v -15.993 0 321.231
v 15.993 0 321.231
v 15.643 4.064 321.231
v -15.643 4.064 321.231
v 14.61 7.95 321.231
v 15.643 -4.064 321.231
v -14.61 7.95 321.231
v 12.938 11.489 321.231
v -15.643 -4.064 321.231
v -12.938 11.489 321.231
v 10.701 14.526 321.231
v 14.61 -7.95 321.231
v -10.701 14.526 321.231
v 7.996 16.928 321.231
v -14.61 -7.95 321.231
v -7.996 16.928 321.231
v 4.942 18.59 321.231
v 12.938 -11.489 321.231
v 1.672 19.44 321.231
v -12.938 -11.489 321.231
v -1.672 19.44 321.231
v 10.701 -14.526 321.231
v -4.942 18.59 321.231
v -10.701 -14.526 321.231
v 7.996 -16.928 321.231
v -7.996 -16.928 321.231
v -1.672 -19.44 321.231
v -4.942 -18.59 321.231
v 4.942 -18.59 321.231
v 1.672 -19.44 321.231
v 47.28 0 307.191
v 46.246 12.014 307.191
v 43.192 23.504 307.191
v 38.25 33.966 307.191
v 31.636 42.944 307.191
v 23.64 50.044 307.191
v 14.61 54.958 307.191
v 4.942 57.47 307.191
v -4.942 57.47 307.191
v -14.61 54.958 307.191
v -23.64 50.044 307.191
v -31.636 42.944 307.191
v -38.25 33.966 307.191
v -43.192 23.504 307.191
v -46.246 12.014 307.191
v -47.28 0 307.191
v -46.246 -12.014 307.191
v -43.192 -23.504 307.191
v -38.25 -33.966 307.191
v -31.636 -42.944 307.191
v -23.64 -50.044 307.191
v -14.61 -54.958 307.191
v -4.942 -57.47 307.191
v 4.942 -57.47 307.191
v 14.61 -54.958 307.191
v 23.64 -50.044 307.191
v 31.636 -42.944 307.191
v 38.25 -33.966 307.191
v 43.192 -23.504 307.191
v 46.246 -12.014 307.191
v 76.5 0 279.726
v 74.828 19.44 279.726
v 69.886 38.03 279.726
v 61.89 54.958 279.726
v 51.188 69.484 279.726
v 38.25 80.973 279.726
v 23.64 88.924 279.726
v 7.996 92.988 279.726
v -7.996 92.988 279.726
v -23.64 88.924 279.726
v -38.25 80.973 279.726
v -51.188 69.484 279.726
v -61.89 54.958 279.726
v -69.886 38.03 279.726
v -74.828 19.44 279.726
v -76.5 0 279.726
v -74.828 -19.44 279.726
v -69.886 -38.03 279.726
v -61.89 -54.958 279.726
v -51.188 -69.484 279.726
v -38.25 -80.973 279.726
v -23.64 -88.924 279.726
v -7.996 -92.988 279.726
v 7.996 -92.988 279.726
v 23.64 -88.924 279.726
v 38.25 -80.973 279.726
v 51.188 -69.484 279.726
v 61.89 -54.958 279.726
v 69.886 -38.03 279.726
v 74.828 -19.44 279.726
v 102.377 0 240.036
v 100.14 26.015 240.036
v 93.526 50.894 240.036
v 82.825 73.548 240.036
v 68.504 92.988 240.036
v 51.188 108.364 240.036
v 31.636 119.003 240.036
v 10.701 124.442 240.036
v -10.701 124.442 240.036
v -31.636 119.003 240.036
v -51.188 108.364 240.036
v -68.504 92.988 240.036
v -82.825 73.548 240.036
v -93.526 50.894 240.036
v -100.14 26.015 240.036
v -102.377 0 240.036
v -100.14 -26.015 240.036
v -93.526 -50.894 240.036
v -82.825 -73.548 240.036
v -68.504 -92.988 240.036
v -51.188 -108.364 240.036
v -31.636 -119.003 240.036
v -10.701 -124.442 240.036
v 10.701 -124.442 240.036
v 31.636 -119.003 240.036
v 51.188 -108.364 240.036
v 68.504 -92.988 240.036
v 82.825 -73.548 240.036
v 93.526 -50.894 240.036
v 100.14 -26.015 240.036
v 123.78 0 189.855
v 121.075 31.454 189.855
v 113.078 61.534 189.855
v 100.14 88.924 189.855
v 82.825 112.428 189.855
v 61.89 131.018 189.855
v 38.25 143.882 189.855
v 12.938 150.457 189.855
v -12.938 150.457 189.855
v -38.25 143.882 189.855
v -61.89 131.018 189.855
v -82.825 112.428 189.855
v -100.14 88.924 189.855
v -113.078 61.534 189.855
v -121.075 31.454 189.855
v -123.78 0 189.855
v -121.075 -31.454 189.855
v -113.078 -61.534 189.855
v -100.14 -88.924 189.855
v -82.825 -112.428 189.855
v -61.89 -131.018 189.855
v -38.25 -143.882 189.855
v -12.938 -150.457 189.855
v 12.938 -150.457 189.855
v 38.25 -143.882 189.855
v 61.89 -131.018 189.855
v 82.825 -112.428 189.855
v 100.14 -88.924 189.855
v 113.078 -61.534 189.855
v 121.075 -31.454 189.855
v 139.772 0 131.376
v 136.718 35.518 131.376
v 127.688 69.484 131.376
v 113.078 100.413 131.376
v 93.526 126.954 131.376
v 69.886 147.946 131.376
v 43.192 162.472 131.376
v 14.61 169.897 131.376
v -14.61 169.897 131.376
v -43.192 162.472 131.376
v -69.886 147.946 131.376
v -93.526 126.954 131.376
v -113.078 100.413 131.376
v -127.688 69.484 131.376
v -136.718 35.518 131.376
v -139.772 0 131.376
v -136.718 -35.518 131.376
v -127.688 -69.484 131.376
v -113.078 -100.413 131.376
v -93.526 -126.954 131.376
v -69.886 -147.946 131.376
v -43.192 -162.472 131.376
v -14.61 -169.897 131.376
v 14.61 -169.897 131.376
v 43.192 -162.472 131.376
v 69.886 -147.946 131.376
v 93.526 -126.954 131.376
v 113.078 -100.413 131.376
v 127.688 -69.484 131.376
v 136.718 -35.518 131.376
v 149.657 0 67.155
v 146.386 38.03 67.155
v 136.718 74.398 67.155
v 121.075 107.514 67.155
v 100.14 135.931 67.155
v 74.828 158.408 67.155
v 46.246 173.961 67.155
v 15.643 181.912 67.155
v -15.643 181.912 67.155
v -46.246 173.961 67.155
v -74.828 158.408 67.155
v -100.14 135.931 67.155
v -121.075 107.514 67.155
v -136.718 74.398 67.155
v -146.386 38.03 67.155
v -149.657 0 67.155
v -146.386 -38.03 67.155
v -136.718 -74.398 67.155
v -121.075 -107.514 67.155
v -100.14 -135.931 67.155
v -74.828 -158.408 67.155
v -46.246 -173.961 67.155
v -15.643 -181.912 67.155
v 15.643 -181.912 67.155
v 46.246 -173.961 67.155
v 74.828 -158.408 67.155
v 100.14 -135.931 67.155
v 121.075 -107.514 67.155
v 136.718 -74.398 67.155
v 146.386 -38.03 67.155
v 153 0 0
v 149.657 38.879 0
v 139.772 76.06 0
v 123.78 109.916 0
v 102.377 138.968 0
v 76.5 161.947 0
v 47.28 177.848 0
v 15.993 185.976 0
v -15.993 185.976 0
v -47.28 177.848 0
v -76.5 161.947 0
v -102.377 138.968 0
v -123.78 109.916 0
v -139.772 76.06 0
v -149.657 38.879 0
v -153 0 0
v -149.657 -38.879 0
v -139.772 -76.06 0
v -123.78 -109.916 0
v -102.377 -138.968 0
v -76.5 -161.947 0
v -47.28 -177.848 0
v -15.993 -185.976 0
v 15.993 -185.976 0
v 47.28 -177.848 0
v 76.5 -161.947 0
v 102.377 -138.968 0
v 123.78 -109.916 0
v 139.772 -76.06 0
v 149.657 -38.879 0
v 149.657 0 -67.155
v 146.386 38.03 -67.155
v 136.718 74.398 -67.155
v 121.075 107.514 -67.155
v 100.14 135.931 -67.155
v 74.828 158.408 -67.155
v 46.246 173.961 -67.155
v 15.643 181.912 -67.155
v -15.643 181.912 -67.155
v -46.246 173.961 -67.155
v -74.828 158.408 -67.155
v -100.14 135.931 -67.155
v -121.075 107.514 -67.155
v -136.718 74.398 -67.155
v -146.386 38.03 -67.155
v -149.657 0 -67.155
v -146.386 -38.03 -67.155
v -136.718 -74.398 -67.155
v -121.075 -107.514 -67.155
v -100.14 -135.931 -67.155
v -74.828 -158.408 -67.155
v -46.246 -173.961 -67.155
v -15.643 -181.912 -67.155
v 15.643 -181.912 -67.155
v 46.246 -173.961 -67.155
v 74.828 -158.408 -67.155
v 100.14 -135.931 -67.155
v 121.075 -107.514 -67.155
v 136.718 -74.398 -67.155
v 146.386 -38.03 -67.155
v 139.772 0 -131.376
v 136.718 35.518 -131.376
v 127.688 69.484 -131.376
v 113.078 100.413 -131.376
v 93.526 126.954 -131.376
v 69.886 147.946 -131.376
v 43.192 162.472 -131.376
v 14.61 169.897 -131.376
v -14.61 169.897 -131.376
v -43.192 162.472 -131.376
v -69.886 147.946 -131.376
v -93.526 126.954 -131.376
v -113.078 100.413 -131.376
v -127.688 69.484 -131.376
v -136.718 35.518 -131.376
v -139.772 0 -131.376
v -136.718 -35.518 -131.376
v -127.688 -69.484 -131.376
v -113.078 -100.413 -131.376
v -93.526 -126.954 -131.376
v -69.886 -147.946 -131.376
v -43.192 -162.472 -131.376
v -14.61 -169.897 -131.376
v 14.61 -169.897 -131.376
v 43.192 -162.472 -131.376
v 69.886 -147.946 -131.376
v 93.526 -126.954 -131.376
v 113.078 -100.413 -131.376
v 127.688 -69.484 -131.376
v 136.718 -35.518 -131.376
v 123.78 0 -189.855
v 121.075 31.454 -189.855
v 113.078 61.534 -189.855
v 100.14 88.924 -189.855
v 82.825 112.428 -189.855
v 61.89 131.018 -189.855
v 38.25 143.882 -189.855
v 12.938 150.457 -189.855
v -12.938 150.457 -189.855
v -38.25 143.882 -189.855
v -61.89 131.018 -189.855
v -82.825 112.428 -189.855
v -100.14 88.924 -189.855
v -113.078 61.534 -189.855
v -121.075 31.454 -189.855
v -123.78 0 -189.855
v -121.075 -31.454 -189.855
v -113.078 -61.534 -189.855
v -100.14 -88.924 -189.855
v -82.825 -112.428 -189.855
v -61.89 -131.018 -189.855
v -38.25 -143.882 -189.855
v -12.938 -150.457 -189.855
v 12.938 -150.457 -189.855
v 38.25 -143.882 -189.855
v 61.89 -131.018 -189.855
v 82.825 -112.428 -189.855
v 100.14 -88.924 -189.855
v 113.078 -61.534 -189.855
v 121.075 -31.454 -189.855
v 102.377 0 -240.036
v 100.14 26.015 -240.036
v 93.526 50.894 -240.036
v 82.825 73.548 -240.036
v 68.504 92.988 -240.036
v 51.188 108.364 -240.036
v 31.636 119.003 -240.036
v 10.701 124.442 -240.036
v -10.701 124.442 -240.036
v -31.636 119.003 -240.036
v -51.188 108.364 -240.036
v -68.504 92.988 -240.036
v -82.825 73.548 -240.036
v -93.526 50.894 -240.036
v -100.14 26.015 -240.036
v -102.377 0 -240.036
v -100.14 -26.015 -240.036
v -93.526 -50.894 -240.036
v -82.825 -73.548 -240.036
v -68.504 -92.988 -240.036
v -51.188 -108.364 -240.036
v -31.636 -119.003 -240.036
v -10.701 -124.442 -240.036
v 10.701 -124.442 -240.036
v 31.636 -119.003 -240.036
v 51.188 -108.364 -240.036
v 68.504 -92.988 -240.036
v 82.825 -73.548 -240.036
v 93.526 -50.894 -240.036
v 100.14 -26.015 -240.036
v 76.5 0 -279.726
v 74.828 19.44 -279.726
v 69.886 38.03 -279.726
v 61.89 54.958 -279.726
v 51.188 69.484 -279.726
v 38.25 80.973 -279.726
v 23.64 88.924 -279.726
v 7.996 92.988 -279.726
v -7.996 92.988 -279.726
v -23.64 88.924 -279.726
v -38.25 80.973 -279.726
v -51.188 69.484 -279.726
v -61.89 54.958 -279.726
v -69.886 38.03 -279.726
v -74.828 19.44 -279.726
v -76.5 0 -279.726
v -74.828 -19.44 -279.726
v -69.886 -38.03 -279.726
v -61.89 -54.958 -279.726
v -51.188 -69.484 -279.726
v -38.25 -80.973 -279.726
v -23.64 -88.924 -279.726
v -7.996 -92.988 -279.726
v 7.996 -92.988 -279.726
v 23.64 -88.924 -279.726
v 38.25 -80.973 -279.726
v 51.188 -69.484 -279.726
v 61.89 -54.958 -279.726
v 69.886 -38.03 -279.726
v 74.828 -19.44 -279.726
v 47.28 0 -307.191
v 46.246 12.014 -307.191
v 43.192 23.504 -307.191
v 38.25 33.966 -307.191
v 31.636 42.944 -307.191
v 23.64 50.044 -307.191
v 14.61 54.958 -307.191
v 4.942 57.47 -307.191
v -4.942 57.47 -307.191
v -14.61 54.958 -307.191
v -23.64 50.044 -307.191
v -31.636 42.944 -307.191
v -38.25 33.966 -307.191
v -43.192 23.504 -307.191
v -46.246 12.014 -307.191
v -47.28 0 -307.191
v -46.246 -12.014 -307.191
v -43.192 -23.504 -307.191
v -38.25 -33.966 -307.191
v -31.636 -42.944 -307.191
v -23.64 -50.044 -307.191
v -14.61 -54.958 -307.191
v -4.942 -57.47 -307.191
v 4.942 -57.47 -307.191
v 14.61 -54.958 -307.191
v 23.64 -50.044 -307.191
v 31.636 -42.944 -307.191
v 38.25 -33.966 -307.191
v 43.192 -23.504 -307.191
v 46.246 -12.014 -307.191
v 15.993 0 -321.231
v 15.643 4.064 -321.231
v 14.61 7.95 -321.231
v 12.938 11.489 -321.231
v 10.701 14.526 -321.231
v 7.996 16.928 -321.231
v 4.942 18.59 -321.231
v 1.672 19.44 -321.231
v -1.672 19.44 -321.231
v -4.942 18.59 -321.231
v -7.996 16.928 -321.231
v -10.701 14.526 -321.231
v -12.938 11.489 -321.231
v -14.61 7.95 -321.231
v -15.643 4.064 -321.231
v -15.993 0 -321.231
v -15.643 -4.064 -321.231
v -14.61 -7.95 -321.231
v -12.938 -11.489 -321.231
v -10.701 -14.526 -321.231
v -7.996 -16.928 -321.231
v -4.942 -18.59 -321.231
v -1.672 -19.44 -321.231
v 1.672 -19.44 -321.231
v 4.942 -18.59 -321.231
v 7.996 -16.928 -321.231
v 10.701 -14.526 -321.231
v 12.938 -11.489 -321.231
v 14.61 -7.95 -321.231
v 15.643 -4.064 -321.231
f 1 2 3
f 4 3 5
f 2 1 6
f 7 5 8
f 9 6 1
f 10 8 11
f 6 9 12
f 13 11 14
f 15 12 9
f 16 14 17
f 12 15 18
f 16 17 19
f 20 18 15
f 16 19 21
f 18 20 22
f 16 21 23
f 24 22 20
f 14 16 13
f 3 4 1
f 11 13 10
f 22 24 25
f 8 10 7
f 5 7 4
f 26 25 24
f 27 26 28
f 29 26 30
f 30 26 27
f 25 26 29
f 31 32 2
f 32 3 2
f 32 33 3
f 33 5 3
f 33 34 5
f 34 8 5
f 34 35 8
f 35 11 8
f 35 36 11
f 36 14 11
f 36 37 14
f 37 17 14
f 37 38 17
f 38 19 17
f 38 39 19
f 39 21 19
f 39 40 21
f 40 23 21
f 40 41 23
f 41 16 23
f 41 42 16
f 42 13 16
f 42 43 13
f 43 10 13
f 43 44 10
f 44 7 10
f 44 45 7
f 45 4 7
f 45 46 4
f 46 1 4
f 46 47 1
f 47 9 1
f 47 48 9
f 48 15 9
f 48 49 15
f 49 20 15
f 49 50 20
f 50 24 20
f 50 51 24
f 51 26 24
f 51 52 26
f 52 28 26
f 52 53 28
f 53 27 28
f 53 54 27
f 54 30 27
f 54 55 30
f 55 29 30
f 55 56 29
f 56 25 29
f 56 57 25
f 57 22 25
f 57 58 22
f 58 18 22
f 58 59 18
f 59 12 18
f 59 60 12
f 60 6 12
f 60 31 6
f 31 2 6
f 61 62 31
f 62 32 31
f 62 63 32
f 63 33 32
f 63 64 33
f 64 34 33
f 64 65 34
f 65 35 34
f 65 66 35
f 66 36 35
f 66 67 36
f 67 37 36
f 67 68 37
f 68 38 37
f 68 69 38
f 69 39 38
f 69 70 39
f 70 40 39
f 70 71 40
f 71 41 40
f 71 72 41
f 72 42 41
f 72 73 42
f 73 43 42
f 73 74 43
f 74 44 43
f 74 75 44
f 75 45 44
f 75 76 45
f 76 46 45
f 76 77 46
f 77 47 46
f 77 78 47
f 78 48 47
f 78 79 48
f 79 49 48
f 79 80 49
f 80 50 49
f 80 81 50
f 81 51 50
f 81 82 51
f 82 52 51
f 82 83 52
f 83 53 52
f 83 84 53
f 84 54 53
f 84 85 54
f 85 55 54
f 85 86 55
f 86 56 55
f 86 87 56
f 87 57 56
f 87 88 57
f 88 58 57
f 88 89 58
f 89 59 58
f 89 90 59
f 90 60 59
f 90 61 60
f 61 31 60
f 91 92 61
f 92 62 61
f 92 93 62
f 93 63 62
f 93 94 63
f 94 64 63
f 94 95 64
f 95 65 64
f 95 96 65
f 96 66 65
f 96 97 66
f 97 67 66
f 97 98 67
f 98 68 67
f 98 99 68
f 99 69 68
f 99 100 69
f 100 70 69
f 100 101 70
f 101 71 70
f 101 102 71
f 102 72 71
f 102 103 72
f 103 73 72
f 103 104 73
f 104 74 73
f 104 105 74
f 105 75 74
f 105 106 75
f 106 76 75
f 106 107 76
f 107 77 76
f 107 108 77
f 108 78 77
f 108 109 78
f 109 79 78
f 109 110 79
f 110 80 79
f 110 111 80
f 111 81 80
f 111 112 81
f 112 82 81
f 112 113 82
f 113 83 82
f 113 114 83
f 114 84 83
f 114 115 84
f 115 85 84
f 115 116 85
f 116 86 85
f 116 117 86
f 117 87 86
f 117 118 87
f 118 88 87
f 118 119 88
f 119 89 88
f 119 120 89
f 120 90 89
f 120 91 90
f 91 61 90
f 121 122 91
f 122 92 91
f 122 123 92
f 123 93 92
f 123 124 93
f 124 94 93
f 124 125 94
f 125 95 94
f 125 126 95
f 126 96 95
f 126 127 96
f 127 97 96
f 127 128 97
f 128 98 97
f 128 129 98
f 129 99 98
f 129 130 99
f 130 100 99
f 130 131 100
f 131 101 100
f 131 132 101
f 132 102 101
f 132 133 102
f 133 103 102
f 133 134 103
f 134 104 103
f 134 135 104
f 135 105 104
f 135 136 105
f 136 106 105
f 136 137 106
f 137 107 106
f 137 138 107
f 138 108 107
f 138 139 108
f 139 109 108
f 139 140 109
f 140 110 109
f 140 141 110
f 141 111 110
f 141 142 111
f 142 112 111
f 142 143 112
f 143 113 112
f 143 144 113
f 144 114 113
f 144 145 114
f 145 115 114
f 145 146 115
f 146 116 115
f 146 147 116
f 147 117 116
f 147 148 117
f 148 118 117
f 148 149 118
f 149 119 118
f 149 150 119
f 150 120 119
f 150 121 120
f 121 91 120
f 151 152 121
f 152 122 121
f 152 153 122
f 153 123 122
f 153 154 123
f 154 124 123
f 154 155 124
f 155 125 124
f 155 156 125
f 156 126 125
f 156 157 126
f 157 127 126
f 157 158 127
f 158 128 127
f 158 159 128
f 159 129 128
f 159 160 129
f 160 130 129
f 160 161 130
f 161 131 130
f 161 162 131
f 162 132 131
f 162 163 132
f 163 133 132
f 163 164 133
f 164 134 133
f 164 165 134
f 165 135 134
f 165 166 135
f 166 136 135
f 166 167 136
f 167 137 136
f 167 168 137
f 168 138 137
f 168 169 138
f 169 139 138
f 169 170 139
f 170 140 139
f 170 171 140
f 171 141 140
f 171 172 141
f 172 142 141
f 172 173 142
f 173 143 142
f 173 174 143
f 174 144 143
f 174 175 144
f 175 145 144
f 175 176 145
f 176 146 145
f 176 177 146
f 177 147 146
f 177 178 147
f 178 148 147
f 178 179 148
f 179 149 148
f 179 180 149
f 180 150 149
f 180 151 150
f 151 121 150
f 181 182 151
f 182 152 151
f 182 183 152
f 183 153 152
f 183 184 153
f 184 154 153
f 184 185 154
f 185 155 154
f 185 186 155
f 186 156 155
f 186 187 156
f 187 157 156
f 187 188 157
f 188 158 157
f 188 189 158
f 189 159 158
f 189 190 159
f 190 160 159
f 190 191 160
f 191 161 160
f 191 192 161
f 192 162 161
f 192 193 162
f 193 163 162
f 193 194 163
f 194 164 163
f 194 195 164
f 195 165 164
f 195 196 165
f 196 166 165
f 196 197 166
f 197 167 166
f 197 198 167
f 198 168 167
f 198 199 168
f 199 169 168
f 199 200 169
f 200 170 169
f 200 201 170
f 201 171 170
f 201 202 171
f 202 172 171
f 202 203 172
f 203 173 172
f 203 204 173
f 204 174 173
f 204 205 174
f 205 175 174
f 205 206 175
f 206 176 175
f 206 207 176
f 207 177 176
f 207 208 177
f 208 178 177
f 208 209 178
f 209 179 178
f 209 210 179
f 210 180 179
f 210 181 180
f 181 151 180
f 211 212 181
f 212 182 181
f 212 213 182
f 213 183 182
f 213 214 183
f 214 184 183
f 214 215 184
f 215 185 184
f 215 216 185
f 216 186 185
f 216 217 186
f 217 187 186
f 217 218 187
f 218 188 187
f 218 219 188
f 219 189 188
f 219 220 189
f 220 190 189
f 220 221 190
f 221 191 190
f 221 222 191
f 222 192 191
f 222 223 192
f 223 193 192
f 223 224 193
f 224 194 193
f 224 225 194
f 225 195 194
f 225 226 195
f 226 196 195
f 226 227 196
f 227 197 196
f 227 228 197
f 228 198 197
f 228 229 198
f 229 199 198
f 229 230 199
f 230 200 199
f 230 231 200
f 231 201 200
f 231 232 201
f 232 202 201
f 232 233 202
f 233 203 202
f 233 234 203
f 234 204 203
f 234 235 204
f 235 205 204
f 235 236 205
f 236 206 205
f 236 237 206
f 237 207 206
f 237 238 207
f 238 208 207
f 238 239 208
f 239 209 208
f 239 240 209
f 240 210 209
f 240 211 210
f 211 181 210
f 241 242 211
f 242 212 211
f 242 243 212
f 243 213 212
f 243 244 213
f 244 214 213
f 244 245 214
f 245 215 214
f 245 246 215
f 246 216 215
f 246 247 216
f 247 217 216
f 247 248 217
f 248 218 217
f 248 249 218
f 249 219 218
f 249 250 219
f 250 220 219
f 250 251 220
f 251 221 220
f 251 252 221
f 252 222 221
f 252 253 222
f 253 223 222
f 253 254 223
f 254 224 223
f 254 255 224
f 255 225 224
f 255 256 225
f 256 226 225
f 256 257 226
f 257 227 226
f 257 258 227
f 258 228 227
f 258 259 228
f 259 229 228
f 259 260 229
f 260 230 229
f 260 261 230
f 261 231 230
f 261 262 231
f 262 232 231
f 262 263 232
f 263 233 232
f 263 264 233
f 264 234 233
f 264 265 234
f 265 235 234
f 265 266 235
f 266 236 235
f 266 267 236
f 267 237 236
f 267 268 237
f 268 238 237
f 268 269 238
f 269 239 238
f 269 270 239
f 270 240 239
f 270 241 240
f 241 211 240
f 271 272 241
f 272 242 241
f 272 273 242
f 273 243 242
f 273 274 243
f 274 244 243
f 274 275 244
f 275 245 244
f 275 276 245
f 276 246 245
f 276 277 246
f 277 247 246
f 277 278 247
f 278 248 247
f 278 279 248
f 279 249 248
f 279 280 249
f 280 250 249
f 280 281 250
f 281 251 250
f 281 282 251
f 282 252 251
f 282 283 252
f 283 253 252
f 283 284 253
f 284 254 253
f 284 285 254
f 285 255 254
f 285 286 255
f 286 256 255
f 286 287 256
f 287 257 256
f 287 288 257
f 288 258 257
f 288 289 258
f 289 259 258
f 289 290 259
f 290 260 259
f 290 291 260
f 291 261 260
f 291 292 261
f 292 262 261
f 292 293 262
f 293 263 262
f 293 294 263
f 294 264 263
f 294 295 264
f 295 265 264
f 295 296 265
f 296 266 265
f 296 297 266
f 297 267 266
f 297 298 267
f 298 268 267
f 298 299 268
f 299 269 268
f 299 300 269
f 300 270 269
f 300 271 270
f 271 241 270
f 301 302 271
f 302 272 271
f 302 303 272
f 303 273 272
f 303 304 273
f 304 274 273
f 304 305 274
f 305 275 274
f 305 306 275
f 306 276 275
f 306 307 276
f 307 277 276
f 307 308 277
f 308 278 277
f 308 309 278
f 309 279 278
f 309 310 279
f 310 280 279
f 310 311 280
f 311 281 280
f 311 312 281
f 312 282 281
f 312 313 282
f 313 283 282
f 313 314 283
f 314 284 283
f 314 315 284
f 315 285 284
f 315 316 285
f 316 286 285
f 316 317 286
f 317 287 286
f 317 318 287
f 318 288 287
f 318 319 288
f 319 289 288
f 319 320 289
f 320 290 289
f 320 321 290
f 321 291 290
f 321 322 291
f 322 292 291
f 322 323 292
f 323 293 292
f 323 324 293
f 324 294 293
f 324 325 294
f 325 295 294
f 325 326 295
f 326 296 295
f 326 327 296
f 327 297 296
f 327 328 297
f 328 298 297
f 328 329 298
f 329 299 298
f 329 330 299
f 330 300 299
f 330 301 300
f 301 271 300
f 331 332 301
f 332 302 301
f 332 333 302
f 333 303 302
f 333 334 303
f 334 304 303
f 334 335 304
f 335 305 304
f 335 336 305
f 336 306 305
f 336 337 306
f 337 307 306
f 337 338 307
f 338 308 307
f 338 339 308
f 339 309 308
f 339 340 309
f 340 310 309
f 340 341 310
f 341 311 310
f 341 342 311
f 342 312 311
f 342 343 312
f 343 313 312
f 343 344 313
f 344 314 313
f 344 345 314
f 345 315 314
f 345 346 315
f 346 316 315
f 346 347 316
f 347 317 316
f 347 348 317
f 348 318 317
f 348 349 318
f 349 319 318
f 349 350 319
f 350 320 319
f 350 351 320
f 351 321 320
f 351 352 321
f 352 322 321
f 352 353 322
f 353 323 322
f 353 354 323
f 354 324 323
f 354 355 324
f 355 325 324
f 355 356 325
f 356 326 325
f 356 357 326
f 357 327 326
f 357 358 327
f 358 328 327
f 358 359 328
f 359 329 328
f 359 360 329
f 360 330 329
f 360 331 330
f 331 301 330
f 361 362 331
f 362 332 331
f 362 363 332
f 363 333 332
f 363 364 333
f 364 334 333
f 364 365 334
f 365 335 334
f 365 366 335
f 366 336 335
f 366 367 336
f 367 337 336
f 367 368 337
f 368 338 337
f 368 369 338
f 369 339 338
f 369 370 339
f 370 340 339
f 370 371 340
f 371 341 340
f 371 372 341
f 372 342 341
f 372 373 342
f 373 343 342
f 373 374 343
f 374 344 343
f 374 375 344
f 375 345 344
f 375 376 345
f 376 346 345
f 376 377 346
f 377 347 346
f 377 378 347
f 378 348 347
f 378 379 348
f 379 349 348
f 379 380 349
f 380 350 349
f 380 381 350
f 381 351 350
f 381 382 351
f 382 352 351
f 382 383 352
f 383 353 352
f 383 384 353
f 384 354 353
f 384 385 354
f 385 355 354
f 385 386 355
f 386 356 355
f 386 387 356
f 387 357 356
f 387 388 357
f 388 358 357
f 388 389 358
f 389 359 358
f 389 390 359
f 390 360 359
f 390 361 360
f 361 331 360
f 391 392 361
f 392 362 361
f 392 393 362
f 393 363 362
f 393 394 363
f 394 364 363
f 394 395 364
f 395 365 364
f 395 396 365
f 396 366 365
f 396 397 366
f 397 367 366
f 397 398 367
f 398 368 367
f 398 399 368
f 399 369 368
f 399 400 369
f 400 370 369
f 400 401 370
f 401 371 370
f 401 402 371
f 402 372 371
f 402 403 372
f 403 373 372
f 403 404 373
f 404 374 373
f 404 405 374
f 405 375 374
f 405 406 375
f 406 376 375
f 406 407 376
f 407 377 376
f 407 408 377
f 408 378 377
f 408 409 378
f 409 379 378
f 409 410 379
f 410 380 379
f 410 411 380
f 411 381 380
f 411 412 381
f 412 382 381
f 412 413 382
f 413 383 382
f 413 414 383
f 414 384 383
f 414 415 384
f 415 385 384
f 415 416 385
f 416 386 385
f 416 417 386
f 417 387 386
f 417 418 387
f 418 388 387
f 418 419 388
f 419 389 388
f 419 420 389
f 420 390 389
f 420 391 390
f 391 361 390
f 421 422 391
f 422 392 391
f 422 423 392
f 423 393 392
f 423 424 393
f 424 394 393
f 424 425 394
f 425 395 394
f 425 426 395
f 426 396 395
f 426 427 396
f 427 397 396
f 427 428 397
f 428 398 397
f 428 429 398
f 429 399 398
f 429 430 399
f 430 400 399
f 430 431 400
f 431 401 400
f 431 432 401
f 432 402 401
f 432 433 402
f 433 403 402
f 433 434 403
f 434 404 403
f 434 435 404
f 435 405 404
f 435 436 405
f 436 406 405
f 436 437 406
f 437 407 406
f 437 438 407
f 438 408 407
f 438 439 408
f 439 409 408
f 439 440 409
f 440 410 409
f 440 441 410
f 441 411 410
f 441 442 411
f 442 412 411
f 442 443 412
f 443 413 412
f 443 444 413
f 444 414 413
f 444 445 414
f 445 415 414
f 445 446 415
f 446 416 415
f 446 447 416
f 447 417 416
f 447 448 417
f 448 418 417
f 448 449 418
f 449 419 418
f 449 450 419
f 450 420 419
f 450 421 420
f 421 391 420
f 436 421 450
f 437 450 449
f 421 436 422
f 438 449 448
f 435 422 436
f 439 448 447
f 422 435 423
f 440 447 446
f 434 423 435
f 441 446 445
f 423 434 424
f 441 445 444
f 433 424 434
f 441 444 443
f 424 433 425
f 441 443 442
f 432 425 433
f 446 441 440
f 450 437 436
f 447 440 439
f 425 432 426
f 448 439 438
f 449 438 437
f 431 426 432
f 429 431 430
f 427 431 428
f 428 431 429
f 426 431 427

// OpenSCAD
// Generated by SolidPython 1.0.1 on 2020-07-29 00:46:48


scale(v = [9, 11, 19]) {
	sphere(r = 17);
}
/***********************************************
*********      SolidPython code:      **********
************************************************
 
# import packages: SolidPython
from solid import *
from solid.utils import *
from itertools import chain, combinations, permutations


class Resize:

    def __init__(self, scad_file):
        self.scad_file = scad_file
        #self.scad_file = import_scad(scad_file)
        # cone/cylinder param:
        self.r1 = 0
        self.r2 = 0
        self.h = 0
        # rectangular prism param:
        self.w = 0
        self.l = 0
        # ellipse param:
        self.r = 0

    # import OpenScad code (file name corresponds to shape)


    # classify shape + parameters
    def assign(self, param1, param2, param3):
        if self.scad_file == 'cone.scad':
            self.r1 = param1
            self.r2 = param2
            self.h = param3
        elif self.scad_file == 'cylinder.scad':
            self.r1 = param1
            self.r2 = param2
            self.h = param3
        elif self.scad_file == 'rectangularPrism.scad':
            self.h = param1
            self.l = param2
            self.w = param3
        else:
            self.r = param1
            self.h = param2

    # resize parameters
    def iterate(self):
        x = range(3, 20, 2)
        i = 1
        if self.scad_file == 'cone.scad':
            tempList = list(permutations(x, 2))
            for temp in tempList:
                param1 = temp[0]
                param2 = temp[1]
                filepath = 'produced_scad_files/' + 'cone' + str(param1) + '_' + str(param2) + '_' + '.scad'
                scad_render_to_file(cylinder(h=param1, r1=param2, r2=0), filepath)

        elif self.scad_file == 'cylinder.scad':
            tempList = list(permutations(x, 3))
            for temp in tempList:
                param1 = temp[0]
                param2 = temp[1]
                filepath = 'produced_scad_files/' + 'cylinder' + str(param1) + '_' + str(param2) + '_' + '.scad'
                scad_render_to_file(cylinder(h=param1, r1=param2, r2=param2), filepath)

        elif self.scad_file == 'rectangularPrism.scad':
            tempList = list(permutations(x, 3))
            for temp in tempList:
                param1 = temp[0]
                param2 = temp[1]
                param3 = temp[2]
                filepath = 'produced_scad_files/' + 'rectangularPrism' + str(param1) + '_' + str(param2) + '_' + str(
                    param3) + '.scad'
                scad_render_to_file(cube(size=(param1, param2, param3)), filepath)

        elif self.scad_file == 'ellipse.scad':
            tempList = list(permutations(x, 4))
            for temp in tempList:
                param1 = temp[0]
                param2 = temp[1]
                param3 = temp[2]
                param4 = temp[3]
                filepath = 'produced_scad_files/' + 'ellipse' + str(param1) + '_' + str(param2) + '_' + str(param3) + '_' + str(param4) + '.scad'
                scad_render_to_file(scale([param1, param2, param3])(sphere(r=param4)), filepath)

    def render_to_scadfile(self):
        scad_render_to_file(scad, 'example.scad') 
 
************************************************/
